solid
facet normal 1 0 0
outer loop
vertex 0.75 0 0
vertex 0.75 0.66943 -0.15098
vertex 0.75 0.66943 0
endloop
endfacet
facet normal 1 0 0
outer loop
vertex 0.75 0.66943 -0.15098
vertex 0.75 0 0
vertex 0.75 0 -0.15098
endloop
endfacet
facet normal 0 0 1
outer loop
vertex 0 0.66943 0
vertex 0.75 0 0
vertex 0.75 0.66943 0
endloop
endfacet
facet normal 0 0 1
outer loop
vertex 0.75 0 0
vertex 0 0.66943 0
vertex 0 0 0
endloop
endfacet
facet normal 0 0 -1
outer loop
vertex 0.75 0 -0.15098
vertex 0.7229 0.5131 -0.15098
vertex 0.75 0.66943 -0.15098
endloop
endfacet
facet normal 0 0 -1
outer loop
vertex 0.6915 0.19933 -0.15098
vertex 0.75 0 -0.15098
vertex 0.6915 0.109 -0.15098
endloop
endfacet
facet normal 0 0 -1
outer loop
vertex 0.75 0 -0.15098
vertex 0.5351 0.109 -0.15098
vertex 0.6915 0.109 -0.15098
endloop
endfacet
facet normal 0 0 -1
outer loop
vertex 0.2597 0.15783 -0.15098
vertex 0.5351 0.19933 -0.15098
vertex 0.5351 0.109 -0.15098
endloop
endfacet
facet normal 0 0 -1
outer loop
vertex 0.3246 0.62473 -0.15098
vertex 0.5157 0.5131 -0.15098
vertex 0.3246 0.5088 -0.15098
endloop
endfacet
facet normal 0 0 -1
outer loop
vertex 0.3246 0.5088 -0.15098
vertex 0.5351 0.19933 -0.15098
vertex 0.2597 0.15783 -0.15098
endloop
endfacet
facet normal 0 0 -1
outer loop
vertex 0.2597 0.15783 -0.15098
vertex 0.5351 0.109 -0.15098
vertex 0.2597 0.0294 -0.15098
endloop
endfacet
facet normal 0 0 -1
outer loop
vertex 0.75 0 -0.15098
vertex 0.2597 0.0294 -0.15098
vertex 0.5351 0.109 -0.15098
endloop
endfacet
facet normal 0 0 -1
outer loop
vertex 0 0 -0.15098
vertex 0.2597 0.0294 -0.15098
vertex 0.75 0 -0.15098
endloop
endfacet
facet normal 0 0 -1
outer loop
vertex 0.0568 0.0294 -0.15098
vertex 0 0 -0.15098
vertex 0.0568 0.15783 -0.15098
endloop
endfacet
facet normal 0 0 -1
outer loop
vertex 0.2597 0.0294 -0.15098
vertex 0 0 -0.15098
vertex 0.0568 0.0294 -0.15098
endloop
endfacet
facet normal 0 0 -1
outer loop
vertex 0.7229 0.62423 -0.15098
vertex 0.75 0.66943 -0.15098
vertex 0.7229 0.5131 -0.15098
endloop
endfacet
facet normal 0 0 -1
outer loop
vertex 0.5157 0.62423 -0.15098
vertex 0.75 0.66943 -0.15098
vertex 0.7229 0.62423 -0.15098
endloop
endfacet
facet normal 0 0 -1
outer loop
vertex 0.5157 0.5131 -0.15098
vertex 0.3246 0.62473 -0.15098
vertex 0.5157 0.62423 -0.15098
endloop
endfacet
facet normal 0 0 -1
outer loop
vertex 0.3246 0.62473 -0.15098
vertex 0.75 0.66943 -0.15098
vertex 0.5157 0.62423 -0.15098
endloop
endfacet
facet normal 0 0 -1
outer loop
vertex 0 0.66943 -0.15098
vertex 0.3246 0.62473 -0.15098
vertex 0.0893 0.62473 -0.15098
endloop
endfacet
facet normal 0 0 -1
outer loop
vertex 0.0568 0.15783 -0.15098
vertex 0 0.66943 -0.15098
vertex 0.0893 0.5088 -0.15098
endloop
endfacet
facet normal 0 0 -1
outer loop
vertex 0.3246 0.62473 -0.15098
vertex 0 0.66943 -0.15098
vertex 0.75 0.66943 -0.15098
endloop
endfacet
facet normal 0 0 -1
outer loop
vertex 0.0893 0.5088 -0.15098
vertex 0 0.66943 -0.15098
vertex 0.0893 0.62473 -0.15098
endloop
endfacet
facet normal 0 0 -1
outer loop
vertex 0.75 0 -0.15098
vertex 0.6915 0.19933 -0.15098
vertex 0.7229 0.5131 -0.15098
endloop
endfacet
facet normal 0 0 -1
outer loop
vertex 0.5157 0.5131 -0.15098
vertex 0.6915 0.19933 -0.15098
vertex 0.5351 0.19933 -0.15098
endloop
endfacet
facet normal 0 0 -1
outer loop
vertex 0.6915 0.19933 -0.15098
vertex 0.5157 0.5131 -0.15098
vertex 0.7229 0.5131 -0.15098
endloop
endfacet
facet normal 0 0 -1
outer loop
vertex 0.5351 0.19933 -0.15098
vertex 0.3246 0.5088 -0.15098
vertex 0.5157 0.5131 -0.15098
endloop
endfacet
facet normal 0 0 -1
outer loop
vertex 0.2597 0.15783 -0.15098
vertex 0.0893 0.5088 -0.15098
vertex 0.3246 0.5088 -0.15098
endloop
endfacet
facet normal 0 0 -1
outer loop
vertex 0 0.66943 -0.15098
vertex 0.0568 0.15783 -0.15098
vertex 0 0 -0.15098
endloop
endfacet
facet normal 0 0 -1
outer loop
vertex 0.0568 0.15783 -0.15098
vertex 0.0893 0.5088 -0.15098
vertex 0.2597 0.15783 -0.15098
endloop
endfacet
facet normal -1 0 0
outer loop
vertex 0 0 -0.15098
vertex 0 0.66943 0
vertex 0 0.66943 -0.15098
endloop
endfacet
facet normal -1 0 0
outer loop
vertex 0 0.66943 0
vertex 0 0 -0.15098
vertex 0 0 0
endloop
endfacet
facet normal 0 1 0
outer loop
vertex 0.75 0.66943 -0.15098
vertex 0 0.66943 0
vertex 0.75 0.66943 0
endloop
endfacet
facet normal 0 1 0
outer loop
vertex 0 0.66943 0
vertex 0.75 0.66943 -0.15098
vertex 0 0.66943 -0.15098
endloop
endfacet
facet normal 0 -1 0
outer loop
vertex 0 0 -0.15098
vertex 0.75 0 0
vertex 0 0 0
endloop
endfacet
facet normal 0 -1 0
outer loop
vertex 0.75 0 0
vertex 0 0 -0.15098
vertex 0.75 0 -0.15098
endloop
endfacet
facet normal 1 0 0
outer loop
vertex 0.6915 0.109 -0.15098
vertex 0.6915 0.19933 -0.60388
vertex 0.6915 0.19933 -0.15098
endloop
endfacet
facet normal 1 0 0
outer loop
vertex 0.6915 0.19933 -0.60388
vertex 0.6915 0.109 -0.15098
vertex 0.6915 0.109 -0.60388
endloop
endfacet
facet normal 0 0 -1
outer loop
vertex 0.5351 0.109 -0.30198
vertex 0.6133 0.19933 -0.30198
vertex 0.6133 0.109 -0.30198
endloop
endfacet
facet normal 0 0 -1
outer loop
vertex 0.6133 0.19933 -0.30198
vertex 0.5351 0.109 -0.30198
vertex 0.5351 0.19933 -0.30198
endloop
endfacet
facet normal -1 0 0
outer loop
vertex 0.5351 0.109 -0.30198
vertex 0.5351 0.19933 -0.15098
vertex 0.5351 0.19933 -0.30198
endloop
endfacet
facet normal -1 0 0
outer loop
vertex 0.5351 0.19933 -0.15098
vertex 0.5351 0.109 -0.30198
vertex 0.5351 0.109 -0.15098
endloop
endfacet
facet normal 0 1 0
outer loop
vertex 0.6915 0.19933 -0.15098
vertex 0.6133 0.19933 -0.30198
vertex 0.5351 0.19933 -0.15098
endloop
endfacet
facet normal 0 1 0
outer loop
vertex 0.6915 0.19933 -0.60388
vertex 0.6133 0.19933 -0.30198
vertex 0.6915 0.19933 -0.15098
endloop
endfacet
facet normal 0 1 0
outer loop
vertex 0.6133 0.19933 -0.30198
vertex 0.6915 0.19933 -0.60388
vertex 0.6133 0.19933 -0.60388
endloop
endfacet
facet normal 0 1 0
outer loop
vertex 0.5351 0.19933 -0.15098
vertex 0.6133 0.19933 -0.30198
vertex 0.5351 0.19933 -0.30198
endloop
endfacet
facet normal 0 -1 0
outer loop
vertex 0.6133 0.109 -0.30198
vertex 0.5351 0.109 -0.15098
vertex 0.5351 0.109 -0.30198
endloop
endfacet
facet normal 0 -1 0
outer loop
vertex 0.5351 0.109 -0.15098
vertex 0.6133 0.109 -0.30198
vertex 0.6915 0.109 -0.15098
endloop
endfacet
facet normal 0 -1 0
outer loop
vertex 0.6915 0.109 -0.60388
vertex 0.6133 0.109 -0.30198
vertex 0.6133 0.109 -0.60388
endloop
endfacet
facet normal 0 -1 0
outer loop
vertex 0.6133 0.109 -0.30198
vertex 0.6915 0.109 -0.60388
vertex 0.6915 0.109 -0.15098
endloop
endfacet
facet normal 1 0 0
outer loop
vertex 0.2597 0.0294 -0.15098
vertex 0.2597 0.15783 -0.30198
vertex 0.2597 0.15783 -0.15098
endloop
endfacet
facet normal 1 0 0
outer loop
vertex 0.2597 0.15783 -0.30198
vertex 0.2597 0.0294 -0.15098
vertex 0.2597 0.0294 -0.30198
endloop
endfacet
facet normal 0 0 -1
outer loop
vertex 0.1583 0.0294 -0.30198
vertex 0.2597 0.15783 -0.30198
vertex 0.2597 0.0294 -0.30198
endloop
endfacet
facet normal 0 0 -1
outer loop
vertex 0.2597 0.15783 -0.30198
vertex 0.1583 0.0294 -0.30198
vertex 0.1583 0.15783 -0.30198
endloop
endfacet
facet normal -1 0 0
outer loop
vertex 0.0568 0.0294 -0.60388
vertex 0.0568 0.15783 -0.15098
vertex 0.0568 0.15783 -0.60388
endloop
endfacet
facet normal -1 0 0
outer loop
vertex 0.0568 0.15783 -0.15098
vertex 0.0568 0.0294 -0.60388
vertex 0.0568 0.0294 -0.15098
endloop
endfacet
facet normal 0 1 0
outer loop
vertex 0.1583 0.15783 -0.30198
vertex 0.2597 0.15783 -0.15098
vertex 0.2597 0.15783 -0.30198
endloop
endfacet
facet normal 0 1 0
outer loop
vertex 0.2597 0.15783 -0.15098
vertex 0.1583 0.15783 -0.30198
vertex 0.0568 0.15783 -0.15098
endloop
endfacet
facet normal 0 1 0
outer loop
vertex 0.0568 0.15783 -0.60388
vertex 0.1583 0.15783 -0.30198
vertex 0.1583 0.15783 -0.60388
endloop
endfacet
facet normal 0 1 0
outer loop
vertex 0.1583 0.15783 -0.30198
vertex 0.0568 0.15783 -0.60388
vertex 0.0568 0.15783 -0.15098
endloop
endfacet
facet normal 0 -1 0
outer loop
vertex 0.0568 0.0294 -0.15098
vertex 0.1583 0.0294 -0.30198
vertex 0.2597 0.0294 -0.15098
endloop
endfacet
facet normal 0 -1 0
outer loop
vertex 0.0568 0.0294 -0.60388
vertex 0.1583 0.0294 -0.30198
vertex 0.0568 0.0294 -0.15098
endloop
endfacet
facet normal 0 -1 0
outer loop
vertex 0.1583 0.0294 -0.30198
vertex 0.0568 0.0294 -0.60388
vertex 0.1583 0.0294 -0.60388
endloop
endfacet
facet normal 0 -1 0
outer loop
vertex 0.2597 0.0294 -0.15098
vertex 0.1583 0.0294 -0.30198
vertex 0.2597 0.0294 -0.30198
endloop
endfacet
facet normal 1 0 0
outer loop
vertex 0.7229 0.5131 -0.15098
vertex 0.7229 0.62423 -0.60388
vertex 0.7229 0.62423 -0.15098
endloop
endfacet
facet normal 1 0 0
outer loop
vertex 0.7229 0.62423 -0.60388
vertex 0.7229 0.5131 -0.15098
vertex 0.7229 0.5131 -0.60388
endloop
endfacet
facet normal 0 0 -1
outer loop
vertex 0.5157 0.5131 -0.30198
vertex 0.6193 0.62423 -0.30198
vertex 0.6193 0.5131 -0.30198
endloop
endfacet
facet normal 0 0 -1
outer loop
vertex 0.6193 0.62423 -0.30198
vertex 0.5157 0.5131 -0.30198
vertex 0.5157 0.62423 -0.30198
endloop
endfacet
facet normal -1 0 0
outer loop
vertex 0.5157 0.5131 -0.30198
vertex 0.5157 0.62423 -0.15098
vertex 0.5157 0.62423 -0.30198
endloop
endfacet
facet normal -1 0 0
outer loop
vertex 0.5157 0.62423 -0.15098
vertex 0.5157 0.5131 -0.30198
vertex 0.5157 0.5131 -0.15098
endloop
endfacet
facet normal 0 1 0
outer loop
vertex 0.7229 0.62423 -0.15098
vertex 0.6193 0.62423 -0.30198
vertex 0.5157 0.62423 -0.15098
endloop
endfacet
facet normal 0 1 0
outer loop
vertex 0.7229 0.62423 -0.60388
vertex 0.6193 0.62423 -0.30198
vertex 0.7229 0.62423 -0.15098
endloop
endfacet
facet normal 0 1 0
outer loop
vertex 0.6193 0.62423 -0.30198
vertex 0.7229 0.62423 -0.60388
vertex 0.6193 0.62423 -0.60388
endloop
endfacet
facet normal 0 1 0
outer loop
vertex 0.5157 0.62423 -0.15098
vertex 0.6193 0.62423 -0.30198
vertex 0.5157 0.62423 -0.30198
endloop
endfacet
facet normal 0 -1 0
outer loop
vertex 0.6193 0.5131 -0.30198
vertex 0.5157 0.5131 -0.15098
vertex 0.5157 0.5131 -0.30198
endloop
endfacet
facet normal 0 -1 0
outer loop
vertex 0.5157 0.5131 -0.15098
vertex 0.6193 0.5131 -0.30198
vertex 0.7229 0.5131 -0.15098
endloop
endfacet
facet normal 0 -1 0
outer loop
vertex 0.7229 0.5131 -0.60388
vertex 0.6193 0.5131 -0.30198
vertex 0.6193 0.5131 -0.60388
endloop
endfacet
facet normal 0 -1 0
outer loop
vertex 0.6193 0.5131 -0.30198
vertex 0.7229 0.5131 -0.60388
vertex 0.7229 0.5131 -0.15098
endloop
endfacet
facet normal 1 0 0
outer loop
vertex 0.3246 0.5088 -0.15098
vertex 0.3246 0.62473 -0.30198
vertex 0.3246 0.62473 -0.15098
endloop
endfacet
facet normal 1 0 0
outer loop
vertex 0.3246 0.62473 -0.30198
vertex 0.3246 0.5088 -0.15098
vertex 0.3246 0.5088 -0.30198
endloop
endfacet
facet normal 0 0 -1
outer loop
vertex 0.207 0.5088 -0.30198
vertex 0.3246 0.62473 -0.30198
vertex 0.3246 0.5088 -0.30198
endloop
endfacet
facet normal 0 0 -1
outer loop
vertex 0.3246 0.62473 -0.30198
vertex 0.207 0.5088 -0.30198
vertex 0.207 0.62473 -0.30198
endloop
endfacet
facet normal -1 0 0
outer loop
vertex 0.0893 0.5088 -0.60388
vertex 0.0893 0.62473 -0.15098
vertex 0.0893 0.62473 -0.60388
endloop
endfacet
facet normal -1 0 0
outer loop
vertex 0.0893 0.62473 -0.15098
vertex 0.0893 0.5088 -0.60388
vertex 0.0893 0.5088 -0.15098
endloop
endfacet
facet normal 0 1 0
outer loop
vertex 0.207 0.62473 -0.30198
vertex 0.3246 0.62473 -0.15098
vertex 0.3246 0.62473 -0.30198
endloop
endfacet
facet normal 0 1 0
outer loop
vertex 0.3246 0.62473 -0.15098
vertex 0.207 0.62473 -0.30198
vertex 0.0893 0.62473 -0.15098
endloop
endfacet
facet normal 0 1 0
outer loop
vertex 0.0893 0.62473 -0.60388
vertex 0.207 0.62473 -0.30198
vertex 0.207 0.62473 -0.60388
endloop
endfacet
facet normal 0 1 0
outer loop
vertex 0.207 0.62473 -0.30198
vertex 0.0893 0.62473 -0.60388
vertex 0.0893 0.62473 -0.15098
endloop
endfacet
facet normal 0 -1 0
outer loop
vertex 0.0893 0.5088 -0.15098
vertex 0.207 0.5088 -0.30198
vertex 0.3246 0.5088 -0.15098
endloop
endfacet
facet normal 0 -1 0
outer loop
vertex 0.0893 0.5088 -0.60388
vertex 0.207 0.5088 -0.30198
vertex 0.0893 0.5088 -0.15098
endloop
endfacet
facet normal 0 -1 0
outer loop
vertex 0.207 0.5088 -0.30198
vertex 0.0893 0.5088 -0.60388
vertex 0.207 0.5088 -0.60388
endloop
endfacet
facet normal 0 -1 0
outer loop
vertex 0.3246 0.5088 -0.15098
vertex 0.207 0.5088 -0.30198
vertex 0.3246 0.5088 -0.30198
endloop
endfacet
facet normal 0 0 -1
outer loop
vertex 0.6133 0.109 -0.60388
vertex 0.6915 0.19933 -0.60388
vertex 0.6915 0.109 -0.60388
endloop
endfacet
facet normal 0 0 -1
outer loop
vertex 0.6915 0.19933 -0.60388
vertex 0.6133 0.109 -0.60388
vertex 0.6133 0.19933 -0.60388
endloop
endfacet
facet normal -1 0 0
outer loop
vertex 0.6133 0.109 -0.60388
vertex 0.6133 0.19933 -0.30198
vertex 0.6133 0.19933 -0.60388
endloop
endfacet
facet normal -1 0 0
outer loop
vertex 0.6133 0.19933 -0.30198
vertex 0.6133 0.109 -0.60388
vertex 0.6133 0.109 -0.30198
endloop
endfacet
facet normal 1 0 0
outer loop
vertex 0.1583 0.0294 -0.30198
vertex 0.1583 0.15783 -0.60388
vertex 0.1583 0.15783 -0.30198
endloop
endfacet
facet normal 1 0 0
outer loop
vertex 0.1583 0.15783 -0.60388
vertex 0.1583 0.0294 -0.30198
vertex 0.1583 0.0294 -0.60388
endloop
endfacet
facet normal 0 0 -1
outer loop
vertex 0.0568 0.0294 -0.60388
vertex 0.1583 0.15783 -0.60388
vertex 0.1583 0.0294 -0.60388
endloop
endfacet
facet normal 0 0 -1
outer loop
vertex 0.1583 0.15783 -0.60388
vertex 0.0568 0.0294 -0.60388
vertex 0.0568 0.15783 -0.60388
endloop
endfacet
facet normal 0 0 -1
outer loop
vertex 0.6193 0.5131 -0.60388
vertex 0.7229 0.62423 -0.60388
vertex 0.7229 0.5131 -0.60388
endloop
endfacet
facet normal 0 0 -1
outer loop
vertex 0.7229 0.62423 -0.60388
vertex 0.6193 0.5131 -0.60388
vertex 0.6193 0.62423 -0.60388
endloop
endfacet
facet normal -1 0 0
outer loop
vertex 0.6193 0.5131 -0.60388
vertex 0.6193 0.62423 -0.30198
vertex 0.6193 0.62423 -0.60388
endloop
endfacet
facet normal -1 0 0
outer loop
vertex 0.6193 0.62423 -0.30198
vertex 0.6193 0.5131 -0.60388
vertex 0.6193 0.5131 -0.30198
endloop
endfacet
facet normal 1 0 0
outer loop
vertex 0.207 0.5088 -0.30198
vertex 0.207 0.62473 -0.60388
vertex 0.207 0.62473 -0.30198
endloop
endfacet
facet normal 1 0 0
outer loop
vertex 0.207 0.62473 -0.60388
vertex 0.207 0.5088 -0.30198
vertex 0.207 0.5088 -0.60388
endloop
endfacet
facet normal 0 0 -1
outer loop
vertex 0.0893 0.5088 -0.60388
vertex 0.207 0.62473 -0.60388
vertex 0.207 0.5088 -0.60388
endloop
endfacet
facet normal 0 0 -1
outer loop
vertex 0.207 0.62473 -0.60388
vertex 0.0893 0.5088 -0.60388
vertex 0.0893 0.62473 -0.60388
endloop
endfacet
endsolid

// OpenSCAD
// Global resolution setting
$fn = 50;

// --------------------------
// Base Dimension Parameters
// --------------------------
base_length = 0.75;        // X-axis: left to right dimension
base_width = 0.669426;     // Y-axis: front to back dimension
base_height = 0.150979;    // Z-axis: top to bottom base thickness

// --------------------------
// Pad Height Parameters
// --------------------------
shallow_pad_height = 0.151;        // Height of upper pads protruding below base underside
deep_pad_height = 0.302;           // Height of lower continuation pads
deep_pad_z_start_offset = 0.1509;  // Distance below base underside where deep pads begin

// --------------------------
// Reusable Pad Module
// Takes edge offsets from base boundaries and z position parameters
// --------------------------
module offset_pad(left_offset, right_offset, front_offset, back_offset, z_bottom, pad_height) {
    pad_x_pos = left_offset;
    pad_y_pos = front_offset;
    pad_x_size = base_length - left_offset - right_offset;
    pad_y_size = base_width - front_offset - back_offset;
    
    translate([pad_x_pos, pad_y_pos, z_bottom])
        cube([pad_x_size, pad_y_size, pad_height]);
}

// --------------------------
// Main Model Assembly
// --------------------------
union() {
    // Base body: top face at Z=0, underside at Z=-base_height
    translate([0, 0, -base_height])
        cube([base_length, base_width, base_height]);

    // --------------------------
    // Shallow Upper Pads
    // --------------------------
    // Pad 1
    offset_pad(
        left_offset = 0.5351,
        right_offset = 0.0585,
        front_offset = 0.109,
        back_offset = 0.4701,
        z_bottom = -base_height - shallow_pad_height,
        pad_height = shallow_pad_height
    );

    // Pad 2
    offset_pad(
        left_offset = 0.0568,
        right_offset = 0.4903,
        front_offset = 0.0294,
        back_offset = 0.5116,
        z_bottom = -base_height - shallow_pad_height,
        pad_height = shallow_pad_height
    );

    // Pad 3
    offset_pad(
        left_offset = 0.5157,
        right_offset = 0.0271,
        front_offset = 0.5131,
        back_offset = 0.0452,
        z_bottom = -base_height - shallow_pad_height,
        pad_height = shallow_pad_height
    );

    // Pad 4
    offset_pad(
        left_offset = 0.0893,
        right_offset = 0.4254,
        front_offset = 0.5088,
        back_offset = 0.0447,
        z_bottom = -base_height - shallow_pad_height,
        pad_height = shallow_pad_height
    );

    // --------------------------
    // Deep Lower Continuation Pads
    // --------------------------
    // Continuation for Pad 1
    offset_pad(
        left_offset = 0.6133,
        right_offset = 0.0585,
        front_offset = 0.109,
        back_offset = 0.4701,
        z_bottom = -base_height - deep_pad_z_start_offset - deep_pad_height,
        pad_height = deep_pad_height
    );

    // Continuation for Pad 2
    offset_pad(
        left_offset = 0.0568,
        right_offset = 0.5917,
        front_offset = 0.0294,
        back_offset = 0.5116,
        z_bottom = -base_height - deep_pad_z_start_offset - deep_pad_height,
        pad_height = deep_pad_height
    );

    // Continuation for Pad 3
    offset_pad(
        left_offset = 0.6193,
        right_offset = 0.0271,
        front_offset = 0.5131,
        back_offset = 0.0452,
        z_bottom = -base_height - deep_pad_z_start_offset - deep_pad_height,
        pad_height = deep_pad_height
    );

    // Continuation for Pad 4
    offset_pad(
        left_offset = 0.0893,
        right_offset = 0.543,
        front_offset = 0.5088,
        back_offset = 0.0447,
        z_bottom = -base_height - deep_pad_z_start_offset - deep_pad_height,
        pad_height = deep_pad_height
    );
}
